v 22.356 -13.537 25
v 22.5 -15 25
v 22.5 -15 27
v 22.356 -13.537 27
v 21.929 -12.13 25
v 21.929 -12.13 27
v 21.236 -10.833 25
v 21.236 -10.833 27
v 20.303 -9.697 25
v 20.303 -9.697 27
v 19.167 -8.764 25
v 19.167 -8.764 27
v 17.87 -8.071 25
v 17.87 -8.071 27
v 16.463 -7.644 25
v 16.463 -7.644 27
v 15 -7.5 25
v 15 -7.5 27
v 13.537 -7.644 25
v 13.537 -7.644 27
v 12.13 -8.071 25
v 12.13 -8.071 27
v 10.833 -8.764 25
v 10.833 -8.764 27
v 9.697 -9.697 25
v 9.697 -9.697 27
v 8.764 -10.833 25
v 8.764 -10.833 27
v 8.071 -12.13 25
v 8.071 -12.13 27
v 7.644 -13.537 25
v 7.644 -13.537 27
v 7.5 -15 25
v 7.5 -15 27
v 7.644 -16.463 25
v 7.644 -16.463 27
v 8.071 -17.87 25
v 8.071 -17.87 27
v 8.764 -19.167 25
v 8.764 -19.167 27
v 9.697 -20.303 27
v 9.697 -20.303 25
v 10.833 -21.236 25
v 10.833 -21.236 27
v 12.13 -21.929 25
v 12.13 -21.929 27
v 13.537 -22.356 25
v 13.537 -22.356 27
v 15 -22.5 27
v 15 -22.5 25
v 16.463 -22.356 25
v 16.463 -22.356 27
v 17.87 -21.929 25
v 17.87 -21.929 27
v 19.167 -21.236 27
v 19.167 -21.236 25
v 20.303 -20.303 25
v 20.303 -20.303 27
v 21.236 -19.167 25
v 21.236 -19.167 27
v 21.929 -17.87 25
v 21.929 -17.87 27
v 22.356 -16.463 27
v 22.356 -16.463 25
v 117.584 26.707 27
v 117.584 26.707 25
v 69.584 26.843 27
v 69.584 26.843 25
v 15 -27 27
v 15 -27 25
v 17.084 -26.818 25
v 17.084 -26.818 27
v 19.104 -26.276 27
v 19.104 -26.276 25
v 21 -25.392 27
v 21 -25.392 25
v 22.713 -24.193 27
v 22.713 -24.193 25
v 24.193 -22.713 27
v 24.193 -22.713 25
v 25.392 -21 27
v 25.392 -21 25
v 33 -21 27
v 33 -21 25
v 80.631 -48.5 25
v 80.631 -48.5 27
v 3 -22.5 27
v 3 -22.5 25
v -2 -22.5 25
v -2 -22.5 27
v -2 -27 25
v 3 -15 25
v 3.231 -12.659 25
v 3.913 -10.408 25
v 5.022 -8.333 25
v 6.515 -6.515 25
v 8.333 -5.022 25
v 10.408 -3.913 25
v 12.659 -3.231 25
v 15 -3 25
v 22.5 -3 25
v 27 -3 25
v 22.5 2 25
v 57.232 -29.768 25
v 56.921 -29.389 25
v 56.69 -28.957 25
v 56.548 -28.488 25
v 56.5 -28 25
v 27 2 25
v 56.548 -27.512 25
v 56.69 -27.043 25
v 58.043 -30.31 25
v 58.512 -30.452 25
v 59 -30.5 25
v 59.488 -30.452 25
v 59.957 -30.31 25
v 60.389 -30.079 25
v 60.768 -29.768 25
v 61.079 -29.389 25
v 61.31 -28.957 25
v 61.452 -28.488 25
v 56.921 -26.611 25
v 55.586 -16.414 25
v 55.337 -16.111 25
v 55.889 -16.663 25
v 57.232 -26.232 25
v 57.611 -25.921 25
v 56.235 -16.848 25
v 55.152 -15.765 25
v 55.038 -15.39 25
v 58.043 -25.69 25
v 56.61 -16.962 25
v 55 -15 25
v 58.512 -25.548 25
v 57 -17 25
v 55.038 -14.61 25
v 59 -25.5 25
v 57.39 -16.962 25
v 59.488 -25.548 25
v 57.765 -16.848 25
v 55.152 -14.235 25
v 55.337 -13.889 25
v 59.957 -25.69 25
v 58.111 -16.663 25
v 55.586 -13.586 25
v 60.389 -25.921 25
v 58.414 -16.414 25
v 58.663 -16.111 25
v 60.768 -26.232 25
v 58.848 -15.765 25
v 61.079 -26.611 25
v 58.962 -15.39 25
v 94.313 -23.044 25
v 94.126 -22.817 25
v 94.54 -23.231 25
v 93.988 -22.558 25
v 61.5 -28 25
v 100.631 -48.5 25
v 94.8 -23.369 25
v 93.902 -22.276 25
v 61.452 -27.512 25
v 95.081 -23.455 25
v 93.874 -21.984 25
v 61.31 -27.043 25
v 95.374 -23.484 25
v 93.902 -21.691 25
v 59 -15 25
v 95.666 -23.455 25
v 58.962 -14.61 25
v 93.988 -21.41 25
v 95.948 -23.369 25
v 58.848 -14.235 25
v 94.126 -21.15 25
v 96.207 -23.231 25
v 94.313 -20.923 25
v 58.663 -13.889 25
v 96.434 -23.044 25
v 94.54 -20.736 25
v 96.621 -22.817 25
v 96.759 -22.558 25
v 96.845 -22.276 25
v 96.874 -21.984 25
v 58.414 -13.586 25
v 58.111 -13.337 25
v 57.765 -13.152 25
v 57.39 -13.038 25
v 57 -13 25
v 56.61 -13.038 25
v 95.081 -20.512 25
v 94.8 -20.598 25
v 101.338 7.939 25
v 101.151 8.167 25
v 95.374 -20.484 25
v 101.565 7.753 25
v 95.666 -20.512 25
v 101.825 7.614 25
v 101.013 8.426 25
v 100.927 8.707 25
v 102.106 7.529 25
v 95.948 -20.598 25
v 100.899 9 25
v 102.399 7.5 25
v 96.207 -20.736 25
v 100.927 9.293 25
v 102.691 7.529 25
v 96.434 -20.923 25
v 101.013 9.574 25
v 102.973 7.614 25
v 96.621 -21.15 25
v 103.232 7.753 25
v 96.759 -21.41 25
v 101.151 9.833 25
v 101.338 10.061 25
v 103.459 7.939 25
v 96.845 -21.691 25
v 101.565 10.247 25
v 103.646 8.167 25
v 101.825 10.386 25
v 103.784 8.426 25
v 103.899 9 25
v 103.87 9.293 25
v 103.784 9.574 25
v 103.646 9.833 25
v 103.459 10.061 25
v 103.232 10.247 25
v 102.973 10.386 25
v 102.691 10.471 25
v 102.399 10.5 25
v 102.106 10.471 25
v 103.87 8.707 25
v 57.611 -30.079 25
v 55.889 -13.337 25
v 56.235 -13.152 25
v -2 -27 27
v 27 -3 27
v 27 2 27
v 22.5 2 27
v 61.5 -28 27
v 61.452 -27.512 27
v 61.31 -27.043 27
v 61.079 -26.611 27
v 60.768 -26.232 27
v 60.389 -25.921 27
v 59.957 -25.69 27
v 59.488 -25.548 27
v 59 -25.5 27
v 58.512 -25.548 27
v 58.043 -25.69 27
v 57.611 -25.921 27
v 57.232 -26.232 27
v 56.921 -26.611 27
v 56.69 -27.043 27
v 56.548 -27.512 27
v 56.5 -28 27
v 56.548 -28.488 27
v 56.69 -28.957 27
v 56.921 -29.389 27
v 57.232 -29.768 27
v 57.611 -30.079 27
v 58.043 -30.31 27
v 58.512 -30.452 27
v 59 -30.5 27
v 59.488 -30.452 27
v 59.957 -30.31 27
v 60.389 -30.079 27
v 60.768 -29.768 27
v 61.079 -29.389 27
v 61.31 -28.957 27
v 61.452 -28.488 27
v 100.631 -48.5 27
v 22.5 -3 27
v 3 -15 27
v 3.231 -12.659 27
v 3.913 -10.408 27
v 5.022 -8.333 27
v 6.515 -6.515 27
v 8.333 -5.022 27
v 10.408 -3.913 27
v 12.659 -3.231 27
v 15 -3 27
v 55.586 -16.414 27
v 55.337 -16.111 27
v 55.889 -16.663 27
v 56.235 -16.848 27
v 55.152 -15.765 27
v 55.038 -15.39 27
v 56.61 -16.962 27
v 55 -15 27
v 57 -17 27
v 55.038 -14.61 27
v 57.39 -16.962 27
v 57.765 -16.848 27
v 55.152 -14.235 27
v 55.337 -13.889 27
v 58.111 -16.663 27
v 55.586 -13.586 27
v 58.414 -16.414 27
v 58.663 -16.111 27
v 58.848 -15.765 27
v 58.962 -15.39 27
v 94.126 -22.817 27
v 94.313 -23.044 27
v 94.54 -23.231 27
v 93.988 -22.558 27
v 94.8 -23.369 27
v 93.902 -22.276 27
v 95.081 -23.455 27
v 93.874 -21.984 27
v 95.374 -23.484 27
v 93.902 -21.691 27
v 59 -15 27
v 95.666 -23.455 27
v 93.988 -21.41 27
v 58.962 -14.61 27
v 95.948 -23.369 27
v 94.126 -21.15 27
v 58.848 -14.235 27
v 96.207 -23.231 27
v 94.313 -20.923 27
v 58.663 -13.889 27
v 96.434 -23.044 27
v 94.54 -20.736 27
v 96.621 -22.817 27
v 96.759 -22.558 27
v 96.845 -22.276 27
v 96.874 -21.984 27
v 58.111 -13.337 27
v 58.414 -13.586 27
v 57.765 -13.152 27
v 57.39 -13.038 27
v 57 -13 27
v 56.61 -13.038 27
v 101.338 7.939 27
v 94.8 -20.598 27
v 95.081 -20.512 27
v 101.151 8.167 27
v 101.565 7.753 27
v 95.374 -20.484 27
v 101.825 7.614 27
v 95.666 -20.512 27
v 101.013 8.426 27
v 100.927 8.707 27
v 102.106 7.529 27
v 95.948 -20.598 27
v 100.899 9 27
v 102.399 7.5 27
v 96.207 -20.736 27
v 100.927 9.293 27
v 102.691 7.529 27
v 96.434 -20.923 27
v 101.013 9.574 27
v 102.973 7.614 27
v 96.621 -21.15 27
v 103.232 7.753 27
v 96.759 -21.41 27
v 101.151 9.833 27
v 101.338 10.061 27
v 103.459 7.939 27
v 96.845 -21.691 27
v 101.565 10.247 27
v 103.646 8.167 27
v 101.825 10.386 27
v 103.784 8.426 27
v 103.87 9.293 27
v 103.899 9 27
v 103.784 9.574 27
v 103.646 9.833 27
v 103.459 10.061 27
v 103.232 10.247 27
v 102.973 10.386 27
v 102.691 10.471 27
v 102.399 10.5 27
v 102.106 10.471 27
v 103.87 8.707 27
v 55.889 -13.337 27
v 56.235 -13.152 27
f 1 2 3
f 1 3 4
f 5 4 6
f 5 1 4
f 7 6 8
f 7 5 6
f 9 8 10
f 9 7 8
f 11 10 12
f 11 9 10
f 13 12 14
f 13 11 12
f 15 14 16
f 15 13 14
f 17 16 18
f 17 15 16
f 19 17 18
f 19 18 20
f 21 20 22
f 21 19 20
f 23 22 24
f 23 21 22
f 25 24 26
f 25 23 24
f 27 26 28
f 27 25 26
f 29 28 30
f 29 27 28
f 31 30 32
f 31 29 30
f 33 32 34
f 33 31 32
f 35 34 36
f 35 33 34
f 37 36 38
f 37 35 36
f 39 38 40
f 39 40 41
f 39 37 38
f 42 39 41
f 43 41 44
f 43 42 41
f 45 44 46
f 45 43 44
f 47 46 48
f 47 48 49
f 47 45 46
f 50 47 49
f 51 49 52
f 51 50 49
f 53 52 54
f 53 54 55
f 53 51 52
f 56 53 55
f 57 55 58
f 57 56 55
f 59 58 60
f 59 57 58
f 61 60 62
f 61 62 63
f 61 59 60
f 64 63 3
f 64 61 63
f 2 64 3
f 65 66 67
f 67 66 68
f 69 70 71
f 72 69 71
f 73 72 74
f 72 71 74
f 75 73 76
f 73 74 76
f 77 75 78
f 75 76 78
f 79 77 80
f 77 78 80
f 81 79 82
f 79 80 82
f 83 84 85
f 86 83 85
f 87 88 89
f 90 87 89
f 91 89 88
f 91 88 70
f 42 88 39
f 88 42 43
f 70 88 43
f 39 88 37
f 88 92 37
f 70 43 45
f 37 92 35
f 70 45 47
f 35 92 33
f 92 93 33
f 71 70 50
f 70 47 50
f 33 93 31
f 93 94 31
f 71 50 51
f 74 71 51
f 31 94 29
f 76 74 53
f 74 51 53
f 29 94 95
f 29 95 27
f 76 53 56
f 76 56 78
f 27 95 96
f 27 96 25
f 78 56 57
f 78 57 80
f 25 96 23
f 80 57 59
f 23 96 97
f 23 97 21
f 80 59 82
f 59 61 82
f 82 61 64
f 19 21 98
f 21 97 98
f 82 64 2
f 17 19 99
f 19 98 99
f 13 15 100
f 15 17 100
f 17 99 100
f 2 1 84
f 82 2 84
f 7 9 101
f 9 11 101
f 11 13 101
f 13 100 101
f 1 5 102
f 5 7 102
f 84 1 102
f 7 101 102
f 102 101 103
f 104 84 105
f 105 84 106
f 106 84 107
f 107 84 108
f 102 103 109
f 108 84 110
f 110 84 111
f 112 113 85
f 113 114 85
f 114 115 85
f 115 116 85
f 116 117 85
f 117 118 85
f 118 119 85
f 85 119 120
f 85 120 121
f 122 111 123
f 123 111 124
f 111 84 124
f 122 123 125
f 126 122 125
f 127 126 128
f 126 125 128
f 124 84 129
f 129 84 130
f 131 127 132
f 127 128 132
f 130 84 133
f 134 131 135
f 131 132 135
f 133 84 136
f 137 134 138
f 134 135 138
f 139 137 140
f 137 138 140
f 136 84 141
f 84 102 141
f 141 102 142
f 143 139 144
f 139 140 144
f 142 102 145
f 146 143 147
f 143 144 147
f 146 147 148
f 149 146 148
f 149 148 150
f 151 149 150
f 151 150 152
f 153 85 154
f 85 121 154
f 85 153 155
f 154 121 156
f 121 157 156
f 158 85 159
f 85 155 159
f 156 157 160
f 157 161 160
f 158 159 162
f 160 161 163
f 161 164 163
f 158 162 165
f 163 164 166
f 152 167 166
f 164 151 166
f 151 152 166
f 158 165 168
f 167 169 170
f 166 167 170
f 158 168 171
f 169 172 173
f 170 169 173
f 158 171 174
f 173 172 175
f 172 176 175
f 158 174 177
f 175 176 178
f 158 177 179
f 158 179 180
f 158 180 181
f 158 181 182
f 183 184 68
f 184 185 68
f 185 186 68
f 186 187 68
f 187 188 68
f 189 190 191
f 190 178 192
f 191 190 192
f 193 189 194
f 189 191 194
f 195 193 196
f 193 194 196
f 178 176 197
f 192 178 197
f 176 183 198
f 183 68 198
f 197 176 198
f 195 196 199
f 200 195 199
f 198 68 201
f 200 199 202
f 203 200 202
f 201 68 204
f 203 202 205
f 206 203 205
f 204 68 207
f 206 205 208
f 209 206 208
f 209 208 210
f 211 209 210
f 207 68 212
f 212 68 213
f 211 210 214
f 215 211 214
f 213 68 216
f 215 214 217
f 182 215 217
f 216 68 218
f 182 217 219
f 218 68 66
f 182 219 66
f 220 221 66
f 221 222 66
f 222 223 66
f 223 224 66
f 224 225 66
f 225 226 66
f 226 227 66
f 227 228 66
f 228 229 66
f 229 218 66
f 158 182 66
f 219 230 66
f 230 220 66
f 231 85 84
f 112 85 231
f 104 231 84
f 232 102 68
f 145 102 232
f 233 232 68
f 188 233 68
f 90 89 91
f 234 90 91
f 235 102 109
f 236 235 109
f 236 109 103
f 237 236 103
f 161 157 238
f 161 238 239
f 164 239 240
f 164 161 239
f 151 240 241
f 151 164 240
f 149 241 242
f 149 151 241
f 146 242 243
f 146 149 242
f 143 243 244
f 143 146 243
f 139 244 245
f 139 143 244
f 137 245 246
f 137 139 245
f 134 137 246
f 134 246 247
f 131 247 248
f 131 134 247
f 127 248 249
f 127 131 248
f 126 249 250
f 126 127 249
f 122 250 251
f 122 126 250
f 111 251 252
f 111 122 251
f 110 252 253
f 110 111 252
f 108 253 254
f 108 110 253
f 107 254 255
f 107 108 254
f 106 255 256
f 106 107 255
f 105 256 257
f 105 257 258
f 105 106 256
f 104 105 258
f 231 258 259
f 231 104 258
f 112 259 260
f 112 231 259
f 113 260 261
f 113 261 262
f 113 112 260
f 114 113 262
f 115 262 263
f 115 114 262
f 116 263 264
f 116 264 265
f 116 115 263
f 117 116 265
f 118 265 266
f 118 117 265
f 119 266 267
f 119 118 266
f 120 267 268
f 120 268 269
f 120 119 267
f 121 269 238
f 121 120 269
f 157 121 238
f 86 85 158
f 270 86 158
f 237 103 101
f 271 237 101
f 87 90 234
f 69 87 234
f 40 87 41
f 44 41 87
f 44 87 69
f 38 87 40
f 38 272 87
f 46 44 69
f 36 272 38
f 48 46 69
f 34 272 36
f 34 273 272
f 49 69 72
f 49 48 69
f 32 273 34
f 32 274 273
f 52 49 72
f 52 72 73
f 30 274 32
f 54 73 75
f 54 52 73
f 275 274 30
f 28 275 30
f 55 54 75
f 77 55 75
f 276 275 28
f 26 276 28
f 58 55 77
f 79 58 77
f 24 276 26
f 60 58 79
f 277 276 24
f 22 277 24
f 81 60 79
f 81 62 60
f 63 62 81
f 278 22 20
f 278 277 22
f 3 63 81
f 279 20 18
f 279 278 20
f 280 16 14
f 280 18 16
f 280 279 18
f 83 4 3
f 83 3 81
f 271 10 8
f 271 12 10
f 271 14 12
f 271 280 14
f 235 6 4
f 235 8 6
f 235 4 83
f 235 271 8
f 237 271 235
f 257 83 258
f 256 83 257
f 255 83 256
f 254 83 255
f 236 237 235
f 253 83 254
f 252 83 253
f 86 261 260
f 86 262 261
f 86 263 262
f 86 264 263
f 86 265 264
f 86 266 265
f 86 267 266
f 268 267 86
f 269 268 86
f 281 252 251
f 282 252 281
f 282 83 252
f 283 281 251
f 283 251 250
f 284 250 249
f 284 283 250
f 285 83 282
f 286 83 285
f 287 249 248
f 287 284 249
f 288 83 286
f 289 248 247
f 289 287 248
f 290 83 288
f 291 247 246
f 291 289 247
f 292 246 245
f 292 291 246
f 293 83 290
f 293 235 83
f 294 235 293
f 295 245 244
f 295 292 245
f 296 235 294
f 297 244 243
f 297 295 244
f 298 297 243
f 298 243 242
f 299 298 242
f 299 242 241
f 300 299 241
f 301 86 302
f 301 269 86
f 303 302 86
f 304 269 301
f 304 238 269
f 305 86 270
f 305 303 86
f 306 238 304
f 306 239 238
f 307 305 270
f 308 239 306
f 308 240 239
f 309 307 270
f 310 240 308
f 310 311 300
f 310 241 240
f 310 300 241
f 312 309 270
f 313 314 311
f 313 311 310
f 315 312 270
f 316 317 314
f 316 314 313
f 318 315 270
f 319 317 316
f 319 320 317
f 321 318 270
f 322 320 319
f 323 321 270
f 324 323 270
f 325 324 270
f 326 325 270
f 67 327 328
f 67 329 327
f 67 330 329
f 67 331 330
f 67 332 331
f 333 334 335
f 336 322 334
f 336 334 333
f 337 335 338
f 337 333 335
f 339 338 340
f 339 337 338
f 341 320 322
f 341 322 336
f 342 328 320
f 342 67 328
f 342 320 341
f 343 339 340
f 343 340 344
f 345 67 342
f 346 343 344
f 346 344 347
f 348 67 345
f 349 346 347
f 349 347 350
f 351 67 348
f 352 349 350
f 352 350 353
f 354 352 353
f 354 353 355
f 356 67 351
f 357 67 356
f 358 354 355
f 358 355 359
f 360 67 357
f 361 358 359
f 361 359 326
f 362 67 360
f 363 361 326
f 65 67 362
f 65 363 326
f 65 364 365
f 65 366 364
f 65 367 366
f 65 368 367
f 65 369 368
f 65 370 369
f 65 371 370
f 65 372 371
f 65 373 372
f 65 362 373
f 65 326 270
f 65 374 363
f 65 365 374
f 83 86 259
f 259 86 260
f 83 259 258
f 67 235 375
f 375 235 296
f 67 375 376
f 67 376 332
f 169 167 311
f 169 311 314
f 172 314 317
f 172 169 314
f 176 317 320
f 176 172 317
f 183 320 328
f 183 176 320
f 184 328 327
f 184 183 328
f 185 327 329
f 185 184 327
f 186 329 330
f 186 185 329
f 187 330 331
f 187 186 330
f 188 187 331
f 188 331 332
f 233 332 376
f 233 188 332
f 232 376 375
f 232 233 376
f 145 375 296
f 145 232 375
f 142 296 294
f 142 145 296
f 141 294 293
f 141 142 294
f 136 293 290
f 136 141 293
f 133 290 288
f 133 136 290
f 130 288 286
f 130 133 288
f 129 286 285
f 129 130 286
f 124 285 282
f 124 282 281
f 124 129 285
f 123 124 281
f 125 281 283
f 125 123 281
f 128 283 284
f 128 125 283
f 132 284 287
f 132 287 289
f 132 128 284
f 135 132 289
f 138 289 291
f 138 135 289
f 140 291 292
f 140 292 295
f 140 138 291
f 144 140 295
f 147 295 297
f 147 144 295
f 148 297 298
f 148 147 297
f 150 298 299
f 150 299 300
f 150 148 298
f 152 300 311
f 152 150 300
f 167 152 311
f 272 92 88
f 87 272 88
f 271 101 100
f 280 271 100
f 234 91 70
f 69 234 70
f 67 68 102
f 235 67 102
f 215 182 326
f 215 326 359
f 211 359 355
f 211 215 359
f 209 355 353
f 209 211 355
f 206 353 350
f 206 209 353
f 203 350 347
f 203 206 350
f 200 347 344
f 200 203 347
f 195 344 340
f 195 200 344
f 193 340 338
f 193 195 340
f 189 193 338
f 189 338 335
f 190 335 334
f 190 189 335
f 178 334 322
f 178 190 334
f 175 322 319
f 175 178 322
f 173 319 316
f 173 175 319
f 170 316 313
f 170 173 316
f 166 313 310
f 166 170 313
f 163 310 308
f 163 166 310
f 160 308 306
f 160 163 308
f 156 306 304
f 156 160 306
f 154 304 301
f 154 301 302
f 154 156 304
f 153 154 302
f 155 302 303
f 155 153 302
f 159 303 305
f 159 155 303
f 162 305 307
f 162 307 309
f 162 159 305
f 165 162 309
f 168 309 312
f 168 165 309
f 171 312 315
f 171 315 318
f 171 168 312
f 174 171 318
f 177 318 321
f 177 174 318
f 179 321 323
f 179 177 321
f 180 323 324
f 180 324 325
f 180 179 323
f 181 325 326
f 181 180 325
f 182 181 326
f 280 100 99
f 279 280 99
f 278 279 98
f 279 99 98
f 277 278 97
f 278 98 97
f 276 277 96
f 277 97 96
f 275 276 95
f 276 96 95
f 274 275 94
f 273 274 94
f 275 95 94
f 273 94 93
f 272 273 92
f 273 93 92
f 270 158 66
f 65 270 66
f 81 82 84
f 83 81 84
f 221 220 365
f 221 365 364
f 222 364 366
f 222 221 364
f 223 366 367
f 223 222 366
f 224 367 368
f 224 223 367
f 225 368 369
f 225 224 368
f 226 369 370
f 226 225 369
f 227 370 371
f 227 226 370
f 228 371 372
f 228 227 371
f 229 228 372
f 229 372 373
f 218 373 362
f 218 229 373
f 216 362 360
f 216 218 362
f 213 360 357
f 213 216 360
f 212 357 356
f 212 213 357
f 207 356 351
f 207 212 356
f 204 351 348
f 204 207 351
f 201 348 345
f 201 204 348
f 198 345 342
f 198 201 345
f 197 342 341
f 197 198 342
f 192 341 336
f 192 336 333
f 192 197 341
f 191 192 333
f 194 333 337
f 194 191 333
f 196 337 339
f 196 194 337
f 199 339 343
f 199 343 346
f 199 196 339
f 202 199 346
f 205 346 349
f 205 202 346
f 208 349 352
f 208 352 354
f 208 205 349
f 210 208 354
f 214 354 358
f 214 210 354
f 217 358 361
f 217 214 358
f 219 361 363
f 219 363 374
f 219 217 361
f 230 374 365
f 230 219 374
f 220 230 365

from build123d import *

# Parameters (mm, degrees)
EXTRUDE_START   = 25
SKETCH_2_R      = 2
SKETCH_2_R_2    = 7.5
SKETCH_2_R_3    = 2.5
SKETCH_2_R_4    = 1.5
EXTRUDE_1_DEPTH = 2


with BuildPart() as part:
    # 草图2 → 凸台-拉伸1 (new body)
    with BuildSketch(Plane.XY.offset(EXTRUDE_START)):
        with BuildLine():
            Line((27, -3), (27, 2))
            Line((27, 2), (22.5, 2))
            Line((22.5, 2), (22.5, -3))
            Line((22.5, -3), (15, -3))
            ThreePointArc((15, -3), (6.514718626, -6.514718626), (3, -15))
            Line((3, -15), (3, -22.5))
            Line((3, -22.5), (-2, -22.5))
            Line((-2, -22.5), (-2, -27))
            Line((-2, -27), (15, -27))
            ThreePointArc((15, -27), (21, -25.392304845), (25.392304845, -21))
            Line((25.392304845, -21), (33, -21))
            Line((33, -21), (80.631397208, -48.5))
            Line((80.631397208, -48.5), (100.631397208, -48.5))
            Line((100.631397208, -48.5), (117.584077602, 26.706974803))
            Line((117.584077602, 26.706974803), (69.584077602, 26.842860701))
            Line((69.584077602, 26.842860701), (27, -3))
        make_face()
        with Locations((57, -15)):
            Circle(SKETCH_2_R, mode=Mode.SUBTRACT)
        with Locations((15, -15)):
            Circle(SKETCH_2_R_2, mode=Mode.SUBTRACT)
        with Locations((59, -28)):
            Circle(SKETCH_2_R_3, mode=Mode.SUBTRACT)
        with Locations((102.39866677, 8.999892909)):
            Circle(SKETCH_2_R_4, mode=Mode.SUBTRACT)
        with Locations((95.373546557, -21.983660567)):
            Circle(SKETCH_2_R_4, mode=Mode.SUBTRACT)
    extrude(amount=EXTRUDE_1_DEPTH)


solid = part.part
